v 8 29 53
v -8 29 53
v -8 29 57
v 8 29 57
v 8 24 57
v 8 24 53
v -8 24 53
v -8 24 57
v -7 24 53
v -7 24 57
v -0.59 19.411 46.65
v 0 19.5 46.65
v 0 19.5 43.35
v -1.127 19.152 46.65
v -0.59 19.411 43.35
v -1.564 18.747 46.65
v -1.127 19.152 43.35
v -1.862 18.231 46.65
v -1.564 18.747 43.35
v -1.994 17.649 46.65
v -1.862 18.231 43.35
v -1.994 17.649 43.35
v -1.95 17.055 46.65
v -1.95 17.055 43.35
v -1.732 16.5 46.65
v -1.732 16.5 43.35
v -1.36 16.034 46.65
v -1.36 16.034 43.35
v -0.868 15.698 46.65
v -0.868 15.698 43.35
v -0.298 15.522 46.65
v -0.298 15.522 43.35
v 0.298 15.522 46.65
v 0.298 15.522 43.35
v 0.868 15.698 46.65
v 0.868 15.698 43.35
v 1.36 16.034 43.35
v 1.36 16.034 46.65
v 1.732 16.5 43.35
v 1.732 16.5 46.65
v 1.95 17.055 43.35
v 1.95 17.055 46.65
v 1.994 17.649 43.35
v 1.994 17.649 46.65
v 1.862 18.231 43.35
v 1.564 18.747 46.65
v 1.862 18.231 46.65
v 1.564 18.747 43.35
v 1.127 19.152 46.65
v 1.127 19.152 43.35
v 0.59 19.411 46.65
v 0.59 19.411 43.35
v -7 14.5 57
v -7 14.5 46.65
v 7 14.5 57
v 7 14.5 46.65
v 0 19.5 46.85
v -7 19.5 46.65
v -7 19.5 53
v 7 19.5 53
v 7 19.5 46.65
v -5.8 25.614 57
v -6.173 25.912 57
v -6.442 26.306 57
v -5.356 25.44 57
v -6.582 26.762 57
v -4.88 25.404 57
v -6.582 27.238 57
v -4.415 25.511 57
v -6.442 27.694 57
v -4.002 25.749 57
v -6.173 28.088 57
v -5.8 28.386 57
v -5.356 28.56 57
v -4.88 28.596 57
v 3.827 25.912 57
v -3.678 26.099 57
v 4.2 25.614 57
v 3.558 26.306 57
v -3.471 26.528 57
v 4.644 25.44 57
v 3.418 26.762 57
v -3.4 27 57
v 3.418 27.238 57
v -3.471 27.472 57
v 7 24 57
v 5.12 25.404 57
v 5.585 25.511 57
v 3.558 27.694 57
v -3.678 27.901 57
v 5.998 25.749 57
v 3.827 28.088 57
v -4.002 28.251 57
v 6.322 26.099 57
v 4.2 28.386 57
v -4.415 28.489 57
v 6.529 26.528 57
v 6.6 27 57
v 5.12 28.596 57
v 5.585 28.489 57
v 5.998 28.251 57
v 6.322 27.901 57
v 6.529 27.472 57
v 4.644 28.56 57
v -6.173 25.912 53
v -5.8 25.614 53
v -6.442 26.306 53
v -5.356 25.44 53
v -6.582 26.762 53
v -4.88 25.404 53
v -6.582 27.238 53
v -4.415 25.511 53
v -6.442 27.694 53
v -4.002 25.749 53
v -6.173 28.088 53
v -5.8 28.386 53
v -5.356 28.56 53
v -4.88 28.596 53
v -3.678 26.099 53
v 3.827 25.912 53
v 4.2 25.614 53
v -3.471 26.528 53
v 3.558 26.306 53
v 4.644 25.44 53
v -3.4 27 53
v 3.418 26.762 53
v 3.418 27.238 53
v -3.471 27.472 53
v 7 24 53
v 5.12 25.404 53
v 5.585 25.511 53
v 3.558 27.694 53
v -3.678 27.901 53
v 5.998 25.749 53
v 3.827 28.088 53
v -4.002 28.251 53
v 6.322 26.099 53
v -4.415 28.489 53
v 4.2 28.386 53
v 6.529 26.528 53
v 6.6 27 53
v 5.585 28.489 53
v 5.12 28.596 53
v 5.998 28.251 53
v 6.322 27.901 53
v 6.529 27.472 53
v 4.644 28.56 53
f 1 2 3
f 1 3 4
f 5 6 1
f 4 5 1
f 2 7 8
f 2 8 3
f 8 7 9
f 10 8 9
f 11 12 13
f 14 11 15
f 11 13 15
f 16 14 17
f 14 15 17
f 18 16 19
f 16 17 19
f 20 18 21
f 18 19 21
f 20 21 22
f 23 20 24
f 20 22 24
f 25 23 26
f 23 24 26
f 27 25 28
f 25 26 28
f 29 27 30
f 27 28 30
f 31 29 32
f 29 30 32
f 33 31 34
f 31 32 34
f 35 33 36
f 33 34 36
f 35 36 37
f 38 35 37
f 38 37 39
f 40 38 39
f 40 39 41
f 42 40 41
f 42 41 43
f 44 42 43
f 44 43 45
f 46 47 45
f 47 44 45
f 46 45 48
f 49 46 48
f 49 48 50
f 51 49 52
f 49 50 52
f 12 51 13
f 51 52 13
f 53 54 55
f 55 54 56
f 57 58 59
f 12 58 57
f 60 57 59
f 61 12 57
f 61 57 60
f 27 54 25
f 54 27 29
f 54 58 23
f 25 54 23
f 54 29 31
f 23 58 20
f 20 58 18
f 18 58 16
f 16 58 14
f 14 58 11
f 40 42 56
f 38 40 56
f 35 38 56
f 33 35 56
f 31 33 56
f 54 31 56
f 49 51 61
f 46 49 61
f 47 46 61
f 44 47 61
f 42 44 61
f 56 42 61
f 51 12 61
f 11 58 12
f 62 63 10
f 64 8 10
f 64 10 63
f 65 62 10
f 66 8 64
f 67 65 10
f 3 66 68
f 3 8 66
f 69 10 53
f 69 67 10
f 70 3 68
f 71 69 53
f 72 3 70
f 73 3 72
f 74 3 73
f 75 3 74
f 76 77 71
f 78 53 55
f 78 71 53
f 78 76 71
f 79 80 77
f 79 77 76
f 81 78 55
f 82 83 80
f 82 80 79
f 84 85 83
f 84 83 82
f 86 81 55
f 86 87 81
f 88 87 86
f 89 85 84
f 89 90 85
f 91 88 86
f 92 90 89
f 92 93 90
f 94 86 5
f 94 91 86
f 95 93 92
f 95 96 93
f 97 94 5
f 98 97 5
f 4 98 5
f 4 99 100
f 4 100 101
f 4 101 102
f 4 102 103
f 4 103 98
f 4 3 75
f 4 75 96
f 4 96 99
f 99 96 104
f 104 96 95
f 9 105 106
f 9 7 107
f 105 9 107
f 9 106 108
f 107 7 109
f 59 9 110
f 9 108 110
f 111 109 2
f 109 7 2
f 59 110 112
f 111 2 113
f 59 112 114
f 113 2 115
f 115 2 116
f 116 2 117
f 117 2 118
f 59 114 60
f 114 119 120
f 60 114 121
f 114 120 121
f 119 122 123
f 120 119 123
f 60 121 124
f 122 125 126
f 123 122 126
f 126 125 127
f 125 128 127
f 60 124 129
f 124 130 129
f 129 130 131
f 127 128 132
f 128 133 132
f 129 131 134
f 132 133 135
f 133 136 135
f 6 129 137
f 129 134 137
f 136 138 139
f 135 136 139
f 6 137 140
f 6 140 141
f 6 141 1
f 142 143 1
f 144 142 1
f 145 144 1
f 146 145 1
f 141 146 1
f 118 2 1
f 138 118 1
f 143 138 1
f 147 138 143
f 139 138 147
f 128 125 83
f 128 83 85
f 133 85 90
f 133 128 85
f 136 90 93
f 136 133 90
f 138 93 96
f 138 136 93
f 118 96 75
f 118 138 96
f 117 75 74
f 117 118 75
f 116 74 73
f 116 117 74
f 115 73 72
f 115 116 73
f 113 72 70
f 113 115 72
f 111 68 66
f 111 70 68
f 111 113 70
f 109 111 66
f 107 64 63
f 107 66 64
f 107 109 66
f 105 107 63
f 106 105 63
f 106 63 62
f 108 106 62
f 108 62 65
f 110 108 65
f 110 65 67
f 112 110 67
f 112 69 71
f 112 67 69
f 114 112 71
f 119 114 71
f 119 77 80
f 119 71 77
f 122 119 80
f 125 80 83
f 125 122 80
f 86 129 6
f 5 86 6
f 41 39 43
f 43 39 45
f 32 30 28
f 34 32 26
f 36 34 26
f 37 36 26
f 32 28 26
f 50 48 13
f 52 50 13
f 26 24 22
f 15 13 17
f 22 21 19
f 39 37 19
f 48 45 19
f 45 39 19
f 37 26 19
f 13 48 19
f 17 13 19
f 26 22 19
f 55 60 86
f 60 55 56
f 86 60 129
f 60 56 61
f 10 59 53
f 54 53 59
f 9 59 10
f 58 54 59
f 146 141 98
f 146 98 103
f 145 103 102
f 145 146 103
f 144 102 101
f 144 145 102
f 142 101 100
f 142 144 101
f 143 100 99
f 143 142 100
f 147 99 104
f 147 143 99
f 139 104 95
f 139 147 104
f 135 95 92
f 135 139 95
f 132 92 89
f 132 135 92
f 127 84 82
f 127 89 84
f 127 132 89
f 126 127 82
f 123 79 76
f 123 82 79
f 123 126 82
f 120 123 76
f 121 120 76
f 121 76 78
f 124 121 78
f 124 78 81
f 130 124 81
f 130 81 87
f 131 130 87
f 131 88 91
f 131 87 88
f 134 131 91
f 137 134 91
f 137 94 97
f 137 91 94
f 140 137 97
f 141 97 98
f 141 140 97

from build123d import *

# Parameters (mm, degrees)
INTEGRATED_START                              = 53
INTEGRATED_HORIZONTAL_STOP_PAD_PROFILE_W      = 16
INTEGRATED_HORIZONTAL_STOP_PAD_PROFILE_H      = 5
INTEGRATED_HORIZONTAL_STOP_PAD_DEPTH          = 4
INTEGRAL_START                                = 53
INTEGRAL_UPRIGHT_PROFILE_W                    = 14
INTEGRAL_UPRIGHT_PROFILE_H                    = 9.7
INTEGRAL_UPRIGHT_DEPTH                        = 4
HORIZONTAL_START                              = 46.65
HORIZONTAL_LIMIT_PIN_ARM_PROFILE_W            = 14
HORIZONTAL_LIMIT_PIN_ARM_PROFILE_H            = 5
HORIZONTAL_LIMIT_PIN_ARM_DEPTH                = 6.55
BUILT_START                                   = 43.35
BUILT_IN_STOP_PIN_DIAMETER_4_MM_PROFILE_R     = 2
BUILT_IN_STOP_PIN_DIAMETER_4_MM_DEPTH         = 3.5
STOP_START                                    = 52.9
STOP_CLEARANCE_TWO_M3_HOLES_10_MM_PI_2_R      = 1.6
STOP_CLEARANCE_TWO_M3_HOLES_10_MM_PITCH_DEPTH = 4.2


with BuildPart() as part:
    # Integrated horizontal stop pad profile → Integrated horizontal stop pad (new body)
    with BuildSketch(Plane.XY.offset(INTEGRATED_START)):
        with Locations((0, 26.5)):
            Rectangle(INTEGRATED_HORIZONTAL_STOP_PAD_PROFILE_W, INTEGRATED_HORIZONTAL_STOP_PAD_PROFILE_H)
    extrude(amount=INTEGRATED_HORIZONTAL_STOP_PAD_DEPTH)

    # Integral upright profile → Integral upright (add)
    with BuildSketch(Plane.XY.offset(INTEGRAL_START)):
        with Locations((0, 19.35)):
            Rectangle(INTEGRAL_UPRIGHT_PROFILE_W, INTEGRAL_UPRIGHT_PROFILE_H)
    extrude(amount=INTEGRAL_UPRIGHT_DEPTH)

    # Horizontal limit pin arm profile → Horizontal limit pin arm (add)
    with BuildSketch(Plane.XY.offset(HORIZONTAL_START)):
        with Locations((0, 17)):
            Rectangle(HORIZONTAL_LIMIT_PIN_ARM_PROFILE_W, HORIZONTAL_LIMIT_PIN_ARM_PROFILE_H)
    extrude(amount=HORIZONTAL_LIMIT_PIN_ARM_DEPTH)

    # Built in stop pin diameter 4 mm profile → Built in stop pin diameter 4 mm (add)
    with BuildSketch(Plane.XY.offset(BUILT_START)):
        with Locations(Location((0, 17.5, 0), (0, 0, 90))):
            Circle(BUILT_IN_STOP_PIN_DIAMETER_4_MM_PROFILE_R)
    extrude(amount=BUILT_IN_STOP_PIN_DIAMETER_4_MM_DEPTH)

    # Stop clearance two M3 holes 10 mm pi 2 → Stop clearance two M3 holes 10 mm pitch (cut)
    with BuildSketch(Plane.XY.offset(STOP_START)):
        with Locations((-5, 27)):
            Circle(STOP_CLEARANCE_TWO_M3_HOLES_10_MM_PI_2_R)
        with Locations((5, 27)):
            Circle(STOP_CLEARANCE_TWO_M3_HOLES_10_MM_PI_2_R)
    extrude(amount=STOP_CLEARANCE_TWO_M3_HOLES_10_MM_PITCH_DEPTH, mode=Mode.SUBTRACT)


solid = part.part
